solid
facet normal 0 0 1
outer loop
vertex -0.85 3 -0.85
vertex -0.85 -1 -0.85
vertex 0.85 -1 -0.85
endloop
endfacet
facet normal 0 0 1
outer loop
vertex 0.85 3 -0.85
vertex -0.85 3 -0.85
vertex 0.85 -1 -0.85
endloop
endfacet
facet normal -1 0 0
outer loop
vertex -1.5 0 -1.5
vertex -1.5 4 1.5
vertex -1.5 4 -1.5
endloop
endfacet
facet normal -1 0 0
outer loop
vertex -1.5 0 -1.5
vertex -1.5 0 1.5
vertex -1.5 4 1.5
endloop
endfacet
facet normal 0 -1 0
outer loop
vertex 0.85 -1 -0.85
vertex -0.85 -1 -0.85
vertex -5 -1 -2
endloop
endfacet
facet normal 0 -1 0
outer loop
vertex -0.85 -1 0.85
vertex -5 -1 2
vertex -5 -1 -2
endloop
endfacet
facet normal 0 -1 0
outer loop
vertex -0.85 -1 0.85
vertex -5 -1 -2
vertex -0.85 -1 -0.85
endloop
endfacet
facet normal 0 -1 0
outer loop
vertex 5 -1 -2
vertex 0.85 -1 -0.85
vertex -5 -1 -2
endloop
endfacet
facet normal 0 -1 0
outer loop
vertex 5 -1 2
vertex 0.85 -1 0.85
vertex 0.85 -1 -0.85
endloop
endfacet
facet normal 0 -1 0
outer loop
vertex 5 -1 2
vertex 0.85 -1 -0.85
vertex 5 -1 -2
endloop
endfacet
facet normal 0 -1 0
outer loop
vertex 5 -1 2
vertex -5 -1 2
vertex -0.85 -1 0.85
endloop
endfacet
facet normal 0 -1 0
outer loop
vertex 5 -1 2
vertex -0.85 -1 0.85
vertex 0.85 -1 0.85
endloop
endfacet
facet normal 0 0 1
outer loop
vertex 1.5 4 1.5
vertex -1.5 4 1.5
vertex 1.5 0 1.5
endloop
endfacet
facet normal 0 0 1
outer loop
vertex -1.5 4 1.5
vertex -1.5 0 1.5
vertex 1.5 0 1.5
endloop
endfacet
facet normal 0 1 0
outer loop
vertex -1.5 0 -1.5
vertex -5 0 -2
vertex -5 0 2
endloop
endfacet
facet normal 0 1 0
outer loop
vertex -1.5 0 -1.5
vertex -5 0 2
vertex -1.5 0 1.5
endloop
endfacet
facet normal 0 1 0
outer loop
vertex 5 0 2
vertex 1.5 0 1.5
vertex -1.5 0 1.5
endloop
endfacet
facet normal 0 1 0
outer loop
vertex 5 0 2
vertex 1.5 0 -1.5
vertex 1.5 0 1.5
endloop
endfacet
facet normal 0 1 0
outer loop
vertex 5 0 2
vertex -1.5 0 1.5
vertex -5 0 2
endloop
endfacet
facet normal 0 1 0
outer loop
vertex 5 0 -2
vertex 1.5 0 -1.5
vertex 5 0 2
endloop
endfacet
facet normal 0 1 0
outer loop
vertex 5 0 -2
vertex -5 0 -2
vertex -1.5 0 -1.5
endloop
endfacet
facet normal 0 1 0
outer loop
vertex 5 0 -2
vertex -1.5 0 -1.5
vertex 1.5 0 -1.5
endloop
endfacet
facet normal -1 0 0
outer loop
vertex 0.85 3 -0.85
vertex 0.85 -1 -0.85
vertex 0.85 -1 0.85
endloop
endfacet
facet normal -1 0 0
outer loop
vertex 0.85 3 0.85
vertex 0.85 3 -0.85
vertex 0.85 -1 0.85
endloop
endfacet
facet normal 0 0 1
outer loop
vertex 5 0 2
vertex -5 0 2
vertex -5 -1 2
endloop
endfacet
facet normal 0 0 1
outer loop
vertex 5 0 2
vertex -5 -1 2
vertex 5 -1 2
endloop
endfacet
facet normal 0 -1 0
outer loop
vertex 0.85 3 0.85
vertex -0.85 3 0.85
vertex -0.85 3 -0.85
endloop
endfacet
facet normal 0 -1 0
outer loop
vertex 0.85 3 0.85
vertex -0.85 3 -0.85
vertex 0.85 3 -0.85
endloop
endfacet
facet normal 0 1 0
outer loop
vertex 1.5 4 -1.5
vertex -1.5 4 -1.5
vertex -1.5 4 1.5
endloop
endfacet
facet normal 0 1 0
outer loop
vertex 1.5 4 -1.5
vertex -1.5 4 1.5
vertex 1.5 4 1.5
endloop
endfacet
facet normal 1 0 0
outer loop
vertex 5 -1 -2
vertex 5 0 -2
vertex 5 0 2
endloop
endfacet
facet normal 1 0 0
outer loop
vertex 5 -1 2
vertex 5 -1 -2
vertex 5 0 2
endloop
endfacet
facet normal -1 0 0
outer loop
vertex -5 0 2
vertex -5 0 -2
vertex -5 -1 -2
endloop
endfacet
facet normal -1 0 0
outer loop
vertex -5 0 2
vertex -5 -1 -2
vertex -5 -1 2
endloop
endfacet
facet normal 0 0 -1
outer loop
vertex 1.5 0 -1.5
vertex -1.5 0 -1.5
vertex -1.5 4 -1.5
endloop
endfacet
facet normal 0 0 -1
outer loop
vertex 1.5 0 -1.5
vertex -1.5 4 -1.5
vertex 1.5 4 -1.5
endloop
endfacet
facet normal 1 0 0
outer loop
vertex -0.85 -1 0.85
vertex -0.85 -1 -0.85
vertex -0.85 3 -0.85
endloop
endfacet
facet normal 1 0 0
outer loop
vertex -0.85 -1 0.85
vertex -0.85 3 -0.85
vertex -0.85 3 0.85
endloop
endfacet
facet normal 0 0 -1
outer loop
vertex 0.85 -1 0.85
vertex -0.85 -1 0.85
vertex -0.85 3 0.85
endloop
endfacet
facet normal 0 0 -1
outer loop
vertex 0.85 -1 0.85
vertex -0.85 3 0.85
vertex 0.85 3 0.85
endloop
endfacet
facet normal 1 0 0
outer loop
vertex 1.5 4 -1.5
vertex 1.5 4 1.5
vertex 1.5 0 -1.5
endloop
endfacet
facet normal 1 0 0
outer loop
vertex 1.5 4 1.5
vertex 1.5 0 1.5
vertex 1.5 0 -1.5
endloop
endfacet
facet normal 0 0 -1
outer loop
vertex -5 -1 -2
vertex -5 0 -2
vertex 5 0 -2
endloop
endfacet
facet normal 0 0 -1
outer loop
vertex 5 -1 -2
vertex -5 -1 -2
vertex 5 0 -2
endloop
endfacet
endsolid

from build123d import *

# Parameters (mm, degrees)
SKETCH_1_W          = 10
SKETCH_1_H          = 5
EXTRUDE_1_DEPTH     = 0.5
SKETCH_2_W          = 3
SKETCH_2_H          = 3
EXTRUDE_2_DEPTH     = 0.5
SKETCH_3_W          = 10
SKETCH_3_H          = 5
EXTRUDE_3_DEPTH     = 0.5
EXTRUDE_4_DEPTH     = 5
CUT_EXTRUDE_3_DEPTH = 5
SKETCH_6_W          = 1.6
SKETCH_6_H          = 1.6
CUT_EXTRUDE_4_DEPTH = 1.5
SKETCH_7_W          = 10
SKETCH_7_H          = 0.5
CUT_EXTRUDE_5_DEPTH = 1
SKETCH_8_W          = 10
SKETCH_8_H          = 4
EXTRUDE_5_DEPTH     = 1
SKETCH_11_W         = 10
SKETCH_11_H         = 4
SKETCH_11_W_2       = 3
SKETCH_11_H_2       = 3
CUT_EXTRUDE_6_DEPTH = 0.5
CUT_EXTRUDE_7_REACH = 8.124
SKETCH_6_2_W        = 1.6
SKETCH_6_2_H        = 1.6
SKETCH_12_W         = 10
SKETCH_12_H         = 5
CUT_EXTRUDE_8_DEPTH = 6.937171044
SKETCH_13_W         = 3
SKETCH_13_H         = 3
EXTRUDE_6_DEPTH     = 3
SKETCH_14_W         = 1.7
SKETCH_14_H         = 1.7
CUT_EXTRUDE_9_DEPTH = 4


with BuildPart() as part:
    # 草图1 → 凸台-拉伸1 (new body)
    with BuildSketch(Plane(origin=(0, 0, 0), x_dir=(1, 0, 0), z_dir=(0, 1, 0))):
        Rectangle(SKETCH_1_W, SKETCH_1_H)
    extrude(amount=EXTRUDE_1_DEPTH)

    # 草图2 → 凸台-拉伸2 (add)
    with BuildSketch(Plane(origin=(0, 0.5, 0), x_dir=(1, 0, 0), z_dir=(0, 1, 0))):
        Rectangle(SKETCH_2_W, SKETCH_2_H)
    extrude(amount=EXTRUDE_2_DEPTH)

    # 草图3 → 凸台-拉伸3 (add)
    with BuildSketch(Plane(origin=(0, 1, 0), x_dir=(1, 0, 0), z_dir=(0, 1, 0))):
        Rectangle(SKETCH_3_W, SKETCH_3_H)
    extrude(amount=EXTRUDE_3_DEPTH)

    # 草图4 → 凸台-拉伸4 (add)
    with BuildSketch(Plane.XY.offset(2.5)):
        with BuildLine():
            Line((-5, 1.5), (5, 1.5))
            ThreePointArc((5, 1.5), (0, 2.5), (-5, 1.5))
        make_face()
    extrude(amount=-EXTRUDE_4_DEPTH)

    # 草图5 → 切除-拉伸3 (cut)
    with BuildSketch(Plane.XY.offset(2.5)):
        with BuildLine():
            Line((-4.75, 2.75), (-4.25, 2.75))
            Line((-4.25, 2.75), (-4.25, 1.535662375))
            ThreePointArc((-4.25, 1.535662375), (-4.50094573, 1.445961936), (-4.75, 1.35113631))
            Line((-4.75, 1.35113631), (-4.75, 2.75))
        make_face()
        with BuildLine():
            Line((-3.75, 2.75), (-3.75, 1.697389285))
            ThreePointArc((-3.75, 1.697389285), (-3.500697998, 1.769788877), (-3.25, 1.837195875))
            Line((-3.25, 1.837195875), (-3.25, 2.75))
            Line((-3.25, 2.75), (-3.75, 2.75))
        make_face()
        with BuildLine():
            Line((-2.75, 2.75), (-2.75, 1.95580576))
            ThreePointArc((-2.75, 1.95580576), (-2.500480176, 2.007256715), (-2.25, 2.053808027))
            Line((-2.25, 2.053808027), (-2.25, 2.75))
            Line((-2.25, 2.75), (-2.75, 2.75))
        make_face()
        with BuildLine():
            Line((-1.75, 2.75), (-1.75, 2.131673028))
            ThreePointArc((-1.75, 2.131673028), (-1.50028119, 2.163138904), (-1.25, 2.189764295))
            Line((-1.25, 2.189764295), (-1.25, 2.75))
            Line((-1.25, 2.75), (-1.75, 2.75))
        make_face()
        with BuildLine():
            Line((-0.75, 2.75), (-0.75, 2.228347352))
            ThreePointArc((-0.75, 2.228347352), (-0.500092618, 2.240377492), (-0.25, 2.247595932))
            Line((-0.25, 2.247595932), (-0.25, 2.75))
            Line((-0.25, 2.75), (-0.75, 2.75))
        make_face()
        with BuildLine():
            Line((0.25, 2.75), (0.25, 2.247595932))
            ThreePointArc((0.25, 2.247595932), (0.500092618, 2.240377492), (0.75, 2.228347352))
            Line((0.75, 2.228347352), (0.75, 2.75))
            Line((0.75, 2.75), (0.25, 2.75))
        make_face()
        with BuildLine():
            Line((1.25, 2.75), (1.25, 2.189764295))
            ThreePointArc((1.25, 2.189764295), (1.50028119, 2.163138904), (1.75, 2.131673028))
            Line((1.75, 2.131673028), (1.75, 2.75))
            Line((1.75, 2.75), (1.25, 2.75))
        make_face()
        with BuildLine():
            Line((2.25, 2.75), (2.25, 2.053808027))
            ThreePointArc((2.25, 2.053808027), (2.500480176, 2.007256715), (2.75, 1.95580576))
            Line((2.75, 1.95580576), (2.75, 2.75))
            Line((2.75, 2.75), (2.25, 2.75))
        make_face()
        with BuildLine():
            Line((3.25, 2.75), (3.25, 1.837195875))
            ThreePointArc((3.25, 1.837195875), (3.500697998, 1.769788877), (3.75, 1.697389285))
            Line((3.75, 1.697389285), (3.75, 2.75))
            Line((3.75, 2.75), (3.25, 2.75))
        make_face()
        with BuildLine():
            Line((4.25, 2.75), (4.25, 1.535662375))
            ThreePointArc((4.25, 1.535662375), (4.50094573, 1.445961936), (4.75, 1.35113631))
            Line((4.75, 1.35113631), (4.75, 2.75))
            Line((4.75, 2.75), (4.25, 2.75))
        make_face()
    extrude(amount=-CUT_EXTRUDE_3_DEPTH, mode=Mode.SUBTRACT)

    # 草图6 → 切除-拉伸4 (cut)
    with BuildSketch(Plane.XZ):
        Rectangle(SKETCH_6_W, SKETCH_6_H)
    extrude(amount=-CUT_EXTRUDE_4_DEPTH, mode=Mode.SUBTRACT)

    # 草图7 → 切除-拉伸5 (cut)
    with BuildSketch(Plane.XZ):
        with Locations((0, 2.25)):
            Rectangle(SKETCH_7_W, SKETCH_7_H)
        with Locations((0, -2.25)):
            Rectangle(SKETCH_7_W, SKETCH_7_H)
    extrude(amount=-CUT_EXTRUDE_5_DEPTH, mode=Mode.SUBTRACT)

    # 草图8 → 凸台-拉伸5 (add)
    with BuildSketch(Plane.XZ):
        Rectangle(SKETCH_8_W, SKETCH_8_H)
    extrude(amount=EXTRUDE_5_DEPTH)

    # 草图11 → 切除-拉伸6 (cut)
    with BuildSketch(Plane(origin=(0, 0.5, 0), x_dir=(1, 0, 0), z_dir=(0, 1, 0))):
        Rectangle(SKETCH_11_W, SKETCH_11_H)
        Rectangle(SKETCH_11_W_2, SKETCH_11_H_2, mode=Mode.SUBTRACT)
    extrude(amount=-CUT_EXTRUDE_6_DEPTH, mode=Mode.SUBTRACT)

    # 草图6<2> → 切除-拉伸7 (cut, up to next)
    with BuildSketch(Plane.XZ, mode=Mode.PRIVATE) as cut_extrude_7_sk1:
        Rectangle(SKETCH_6_2_W, SKETCH_6_2_H)
    cut_extrude_7_tool1 = extrude(cut_extrude_7_sk1.sketch, amount=CUT_EXTRUDE_7_REACH, mode=Mode.PRIVATE) & part.part
    add(cut_extrude_7_tool1.solids().sort_by_distance((0, 0, 0))[0], mode=Mode.SUBTRACT)

    # 草图12 → 切除-拉伸8 (cut, through all)
    with BuildSketch(Plane.XZ.offset(-1)):
        Rectangle(SKETCH_12_W, SKETCH_12_H)
    extrude(amount=-CUT_EXTRUDE_8_DEPTH, mode=Mode.SUBTRACT)

    # 草图13 → 凸台-拉伸6 (add)
    with BuildSketch(Plane(origin=(0, 1, 0), x_dir=(1, 0, 0), z_dir=(0, 1, 0))):
        Rectangle(SKETCH_13_W, SKETCH_13_H)
    extrude(amount=EXTRUDE_6_DEPTH)

    # 草图14 → 切除-拉伸9 (cut)
    with BuildSketch(Plane.XZ.offset(1)):
        Rectangle(SKETCH_14_W, SKETCH_14_H)
    extrude(amount=-CUT_EXTRUDE_9_DEPTH, mode=Mode.SUBTRACT)


solid = part.part
